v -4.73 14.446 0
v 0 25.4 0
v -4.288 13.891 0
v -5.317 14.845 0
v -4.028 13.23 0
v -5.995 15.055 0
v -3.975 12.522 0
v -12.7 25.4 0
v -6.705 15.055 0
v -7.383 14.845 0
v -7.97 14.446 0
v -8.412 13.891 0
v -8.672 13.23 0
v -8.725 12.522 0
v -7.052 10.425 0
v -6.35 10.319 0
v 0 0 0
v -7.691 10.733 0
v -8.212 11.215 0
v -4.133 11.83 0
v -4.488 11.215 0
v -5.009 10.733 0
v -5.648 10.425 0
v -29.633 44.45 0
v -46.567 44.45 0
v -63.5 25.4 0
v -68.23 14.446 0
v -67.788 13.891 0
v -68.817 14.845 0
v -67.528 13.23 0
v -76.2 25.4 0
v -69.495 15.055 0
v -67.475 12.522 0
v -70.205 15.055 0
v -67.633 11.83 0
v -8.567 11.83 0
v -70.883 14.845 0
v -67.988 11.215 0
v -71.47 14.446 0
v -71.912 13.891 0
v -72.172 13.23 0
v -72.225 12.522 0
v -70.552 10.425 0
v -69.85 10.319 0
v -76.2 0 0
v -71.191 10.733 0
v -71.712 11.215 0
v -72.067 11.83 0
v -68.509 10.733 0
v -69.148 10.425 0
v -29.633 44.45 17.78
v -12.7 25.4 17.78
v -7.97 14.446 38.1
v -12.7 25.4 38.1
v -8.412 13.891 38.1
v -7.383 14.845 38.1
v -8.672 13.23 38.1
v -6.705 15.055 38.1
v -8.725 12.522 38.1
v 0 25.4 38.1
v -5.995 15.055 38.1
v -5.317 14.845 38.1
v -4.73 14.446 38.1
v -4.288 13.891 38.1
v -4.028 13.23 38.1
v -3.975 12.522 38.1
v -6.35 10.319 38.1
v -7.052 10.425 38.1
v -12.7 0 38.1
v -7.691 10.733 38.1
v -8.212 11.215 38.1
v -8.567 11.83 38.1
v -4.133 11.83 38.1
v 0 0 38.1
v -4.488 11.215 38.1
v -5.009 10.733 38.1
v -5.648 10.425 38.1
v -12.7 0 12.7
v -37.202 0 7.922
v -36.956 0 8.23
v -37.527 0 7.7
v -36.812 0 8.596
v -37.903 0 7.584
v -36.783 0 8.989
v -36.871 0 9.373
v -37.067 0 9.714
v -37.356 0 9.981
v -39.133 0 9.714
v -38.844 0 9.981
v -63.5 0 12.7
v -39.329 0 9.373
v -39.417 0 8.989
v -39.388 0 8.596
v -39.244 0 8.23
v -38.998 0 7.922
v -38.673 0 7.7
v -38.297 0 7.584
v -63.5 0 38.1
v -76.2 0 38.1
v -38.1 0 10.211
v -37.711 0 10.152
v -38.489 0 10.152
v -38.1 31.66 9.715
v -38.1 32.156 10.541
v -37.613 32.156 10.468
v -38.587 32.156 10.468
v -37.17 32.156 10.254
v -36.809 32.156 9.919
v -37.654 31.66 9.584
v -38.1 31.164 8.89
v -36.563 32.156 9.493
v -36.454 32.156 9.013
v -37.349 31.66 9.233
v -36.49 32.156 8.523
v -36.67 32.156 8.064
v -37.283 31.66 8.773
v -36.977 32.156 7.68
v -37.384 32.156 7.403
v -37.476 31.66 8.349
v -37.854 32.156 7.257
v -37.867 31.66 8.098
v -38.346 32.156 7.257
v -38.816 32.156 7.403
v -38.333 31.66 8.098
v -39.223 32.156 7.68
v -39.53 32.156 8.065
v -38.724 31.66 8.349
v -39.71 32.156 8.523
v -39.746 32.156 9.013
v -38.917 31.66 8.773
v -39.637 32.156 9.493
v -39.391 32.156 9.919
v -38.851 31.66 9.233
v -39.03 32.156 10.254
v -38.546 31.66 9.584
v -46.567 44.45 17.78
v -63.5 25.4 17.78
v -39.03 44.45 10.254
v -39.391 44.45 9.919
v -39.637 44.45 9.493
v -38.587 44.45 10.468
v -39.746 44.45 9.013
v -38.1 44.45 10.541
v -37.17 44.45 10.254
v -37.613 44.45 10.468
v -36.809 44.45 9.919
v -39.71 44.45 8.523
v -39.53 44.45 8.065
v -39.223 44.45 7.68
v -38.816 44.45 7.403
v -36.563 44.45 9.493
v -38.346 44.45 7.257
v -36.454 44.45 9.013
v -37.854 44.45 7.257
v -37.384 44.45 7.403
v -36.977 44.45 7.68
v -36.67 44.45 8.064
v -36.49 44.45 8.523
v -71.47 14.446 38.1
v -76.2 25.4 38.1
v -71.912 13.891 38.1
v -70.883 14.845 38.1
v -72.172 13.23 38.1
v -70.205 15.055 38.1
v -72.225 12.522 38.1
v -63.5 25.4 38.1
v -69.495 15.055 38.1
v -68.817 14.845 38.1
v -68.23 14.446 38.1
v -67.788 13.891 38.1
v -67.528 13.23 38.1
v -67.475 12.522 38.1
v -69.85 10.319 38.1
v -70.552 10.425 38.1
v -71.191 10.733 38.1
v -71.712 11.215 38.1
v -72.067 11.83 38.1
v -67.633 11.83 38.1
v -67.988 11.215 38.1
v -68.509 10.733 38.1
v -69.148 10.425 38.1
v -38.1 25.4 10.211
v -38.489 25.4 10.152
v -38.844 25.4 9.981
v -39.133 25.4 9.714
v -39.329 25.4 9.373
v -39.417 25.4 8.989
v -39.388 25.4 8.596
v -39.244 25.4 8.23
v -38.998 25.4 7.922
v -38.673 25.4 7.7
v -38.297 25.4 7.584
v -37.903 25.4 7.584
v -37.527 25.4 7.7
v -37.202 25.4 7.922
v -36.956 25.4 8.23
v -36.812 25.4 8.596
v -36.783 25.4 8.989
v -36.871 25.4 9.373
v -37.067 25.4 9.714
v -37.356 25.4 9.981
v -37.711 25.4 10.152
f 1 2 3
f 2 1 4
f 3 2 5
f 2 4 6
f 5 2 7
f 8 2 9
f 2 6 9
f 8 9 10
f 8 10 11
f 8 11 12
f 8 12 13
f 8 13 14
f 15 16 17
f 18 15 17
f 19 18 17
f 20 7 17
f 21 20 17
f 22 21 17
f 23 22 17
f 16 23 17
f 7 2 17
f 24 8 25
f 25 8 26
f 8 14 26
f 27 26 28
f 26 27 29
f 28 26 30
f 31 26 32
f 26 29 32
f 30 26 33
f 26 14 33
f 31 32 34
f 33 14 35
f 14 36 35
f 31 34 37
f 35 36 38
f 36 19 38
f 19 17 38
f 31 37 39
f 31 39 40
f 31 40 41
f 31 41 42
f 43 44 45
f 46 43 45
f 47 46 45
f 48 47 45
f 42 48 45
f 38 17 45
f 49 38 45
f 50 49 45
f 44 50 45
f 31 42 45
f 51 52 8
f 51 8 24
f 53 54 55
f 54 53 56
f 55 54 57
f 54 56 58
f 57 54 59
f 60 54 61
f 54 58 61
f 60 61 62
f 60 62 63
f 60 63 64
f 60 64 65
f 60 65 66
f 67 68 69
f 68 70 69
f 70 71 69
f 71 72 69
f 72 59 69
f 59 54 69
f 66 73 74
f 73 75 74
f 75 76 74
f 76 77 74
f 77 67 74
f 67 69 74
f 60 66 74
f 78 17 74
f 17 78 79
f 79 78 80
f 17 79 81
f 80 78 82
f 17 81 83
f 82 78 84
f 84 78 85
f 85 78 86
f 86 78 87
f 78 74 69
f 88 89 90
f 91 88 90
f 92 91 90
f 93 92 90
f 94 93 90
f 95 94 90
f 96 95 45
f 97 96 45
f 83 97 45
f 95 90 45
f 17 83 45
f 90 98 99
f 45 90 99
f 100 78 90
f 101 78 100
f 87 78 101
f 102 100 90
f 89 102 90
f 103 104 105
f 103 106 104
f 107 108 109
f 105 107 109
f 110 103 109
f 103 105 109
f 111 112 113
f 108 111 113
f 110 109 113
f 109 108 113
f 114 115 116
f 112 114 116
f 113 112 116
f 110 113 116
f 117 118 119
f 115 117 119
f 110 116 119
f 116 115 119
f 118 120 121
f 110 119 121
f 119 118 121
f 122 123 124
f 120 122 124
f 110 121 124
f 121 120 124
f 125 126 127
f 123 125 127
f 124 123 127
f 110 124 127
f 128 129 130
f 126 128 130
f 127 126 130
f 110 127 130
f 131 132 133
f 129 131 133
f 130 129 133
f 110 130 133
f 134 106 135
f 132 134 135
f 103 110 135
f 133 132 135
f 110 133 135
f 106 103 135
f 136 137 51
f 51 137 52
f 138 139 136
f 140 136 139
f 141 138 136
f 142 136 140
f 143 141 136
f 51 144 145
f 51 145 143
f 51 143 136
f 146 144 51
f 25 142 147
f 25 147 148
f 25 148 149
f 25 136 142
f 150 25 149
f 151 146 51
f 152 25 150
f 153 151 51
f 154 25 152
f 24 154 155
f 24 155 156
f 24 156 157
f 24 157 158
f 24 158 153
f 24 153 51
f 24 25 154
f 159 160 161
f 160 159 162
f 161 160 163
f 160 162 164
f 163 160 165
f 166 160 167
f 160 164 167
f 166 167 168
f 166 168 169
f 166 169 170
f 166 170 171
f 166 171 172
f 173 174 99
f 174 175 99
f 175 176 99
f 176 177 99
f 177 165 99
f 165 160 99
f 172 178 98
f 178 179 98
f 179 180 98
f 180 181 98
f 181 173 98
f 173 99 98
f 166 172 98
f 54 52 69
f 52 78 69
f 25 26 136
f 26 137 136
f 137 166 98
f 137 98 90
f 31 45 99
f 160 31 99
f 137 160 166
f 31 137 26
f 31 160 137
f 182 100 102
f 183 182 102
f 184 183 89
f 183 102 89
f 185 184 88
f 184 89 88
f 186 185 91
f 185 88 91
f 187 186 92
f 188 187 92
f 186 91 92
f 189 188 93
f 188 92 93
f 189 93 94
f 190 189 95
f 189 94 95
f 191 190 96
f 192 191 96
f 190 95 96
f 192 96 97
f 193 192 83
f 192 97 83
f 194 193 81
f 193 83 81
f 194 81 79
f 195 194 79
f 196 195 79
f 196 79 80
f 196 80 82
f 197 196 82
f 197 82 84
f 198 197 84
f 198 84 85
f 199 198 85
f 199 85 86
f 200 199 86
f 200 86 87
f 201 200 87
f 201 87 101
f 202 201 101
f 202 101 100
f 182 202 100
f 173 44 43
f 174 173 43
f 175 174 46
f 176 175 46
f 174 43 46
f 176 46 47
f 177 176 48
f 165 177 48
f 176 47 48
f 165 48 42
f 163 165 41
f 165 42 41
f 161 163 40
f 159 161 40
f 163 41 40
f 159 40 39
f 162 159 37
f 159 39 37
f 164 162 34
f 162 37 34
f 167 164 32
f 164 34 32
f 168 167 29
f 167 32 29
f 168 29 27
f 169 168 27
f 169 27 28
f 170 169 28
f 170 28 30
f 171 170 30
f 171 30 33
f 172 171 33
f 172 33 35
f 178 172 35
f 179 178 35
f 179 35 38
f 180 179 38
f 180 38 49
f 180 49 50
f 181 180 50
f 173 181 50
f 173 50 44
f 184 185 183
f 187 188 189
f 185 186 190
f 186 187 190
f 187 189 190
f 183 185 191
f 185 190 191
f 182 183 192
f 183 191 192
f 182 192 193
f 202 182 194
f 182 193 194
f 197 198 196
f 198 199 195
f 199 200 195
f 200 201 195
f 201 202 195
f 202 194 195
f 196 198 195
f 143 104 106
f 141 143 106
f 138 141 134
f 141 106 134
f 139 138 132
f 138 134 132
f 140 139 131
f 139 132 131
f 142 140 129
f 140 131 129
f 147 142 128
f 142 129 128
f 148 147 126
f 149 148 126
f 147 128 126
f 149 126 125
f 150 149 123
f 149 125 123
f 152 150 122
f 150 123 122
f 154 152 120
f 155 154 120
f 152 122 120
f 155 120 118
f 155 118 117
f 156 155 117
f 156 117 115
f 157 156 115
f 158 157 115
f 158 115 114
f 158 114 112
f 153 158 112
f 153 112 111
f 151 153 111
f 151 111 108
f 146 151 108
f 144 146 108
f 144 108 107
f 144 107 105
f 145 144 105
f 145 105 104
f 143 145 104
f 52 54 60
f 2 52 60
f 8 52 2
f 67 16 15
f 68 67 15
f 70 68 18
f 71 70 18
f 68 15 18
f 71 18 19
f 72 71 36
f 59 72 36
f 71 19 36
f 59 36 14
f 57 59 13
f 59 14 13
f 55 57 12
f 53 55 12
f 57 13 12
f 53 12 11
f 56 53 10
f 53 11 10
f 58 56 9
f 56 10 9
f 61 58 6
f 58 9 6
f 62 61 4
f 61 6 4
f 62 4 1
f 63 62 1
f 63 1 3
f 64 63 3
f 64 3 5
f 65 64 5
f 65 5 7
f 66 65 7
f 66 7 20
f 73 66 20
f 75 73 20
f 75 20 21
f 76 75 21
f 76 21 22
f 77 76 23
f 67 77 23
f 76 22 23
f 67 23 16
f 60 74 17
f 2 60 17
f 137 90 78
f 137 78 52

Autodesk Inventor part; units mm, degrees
ref_plane "YZ Plane" through (0, 0, 0) normal (1, 0, 0) x (0, 1, 0)
ref_plane "XZ Plane" through (0, 0, 0) normal (0, 1, 0) x (-1, 0, 0)
ref_plane "XY Plane" through (0, 0, 0) normal (0, 0, 1) x (1, 0, 0)
sketch "Sketch1" plane through (0, 0, 0) normal (0, 1, 0) x (-1, 0, 0)
  line L0 (0, 0) -> (12.7, 0)
  line L1 (12.7, 0) -> (12.7, 38.1)
  line L2 (12.7, 38.1) -> (0, 38.1)
  line L3 (0, 38.1) -> (0, 0)
  line L4 (12.7, 0) -> (63.5, 0)
  line L5 (63.5, 0) -> (63.5, 12.7)
  line L6 (63.5, 12.7) -> (12.7, 12.7)
  line L7 (12.7, 12.7) -> (12.7, 0)
  line L8 (63.5, 0) -> (76.2, 0)
  line L9 (76.2, 0) -> (76.2, 38.1)
  line L10 (76.2, 38.1) -> (63.5, 38.1)
  line L11 (63.5, 38.1) -> (63.5, 0)
  dimension "d0" = 38.1
  dimension "d1" = 38.1
  dimension "d2" = 12.7
  dimension "d3" = 12.7
  dimension "d5" = 50.8
  dimension "d6" = 12.7
extrude "Extrusion1" add sketch "Sketch1" along normal blind 25.4
sketch "Sketch2" plane through (-63.5, 0, 38.1) normal (1, 0, 0) x (0, 0, -1)
  line L0 (25.4, 0) -> (25.4, 25.4) projected
  line L1 (25.4, 0) -> (20.32, 25.4)
  line L2 (0, 25.4) -> (25.4, 25.4) projected
  point P0 (38.1, 0)
  dimension "d9" = 5.08
extrude "Extrusion2" add sketch "Sketch2" along normal blind 50.8
sketch "Sketch3" plane through (-76.2, 0, 38.1) normal (0, 0, 1) x (1, 0, 0)
  line L0 (0, 25.4) -> (12.7, 25.4) projected
  line L1 (0, 0) -> (0, 25.4) projected
  line L2 (63.5, 25.4) -> (76.2, 25.4) projected
  line L3 (76.2, 0) -> (76.2, 25.4) projected
  point P0 (6.35, 12.7)
  point P1 (69.85, 12.7)
  dimension "d12" = 12.7
  dimension "d13" = 25.4
  dimension "d14" = 6.35
  dimension "d15" = 12.7
  dimension "d16" = 12.7
  dimension "d17" = 25.4
  dimension "d18" = 12.7
  dimension "d19" = 6.35
hole "Hole1" at (-69.85, 12.7, 38.1) at (-6.35, 12.7, 38.1) direction (0, 0, -1) diameter 4.7625 end through all
sketch "Sketch4" plane through (0, 25.4, 0) normal (0, 1, 0) x (1, 0, 0)
  line L0 (0, 0) -> (-76.2, 0) projected
  line L1 (0, -38.1) -> (0, 0) projected
  line L2 (-12.7, -17.78) -> (-12.7, -38.1) projected
  point P0 (-38.1, -8.89)
  dimension "d27" = 38.1
  dimension "d28" = 20.32
  dimension "d29" = 76.2
  dimension "d30" = 38.1
  dimension "d31" = 8.89
hole "Hole2" at (-38.1, 25.4, 8.89) direction (0, -1, 0) diameter 2.6416 end through all thread size "6-32 UNC" class "2B" standard "ANSI Unified Screw Threads"
sketch "Sketch5" plane through (0, 25.4, 0) normal (0, 1, 0) x (1, 0, 0)
  line L0 (-63.5, -17.78) -> (-12.7, -17.78) projected
  line L1 (0, 0) -> (-76.2, 0) projected
  line L2 (-63.5, -17.78) -> (-12.7, -17.78)
  line L3 (-12.7, -17.78) -> (-12.7, 0)
  line L4 (-12.7, 0) -> (-63.5, 0)
  line L5 (-63.5, 0) -> (-63.5, -17.78)
  line L6 (-12.7, -38.1) -> (0, -38.1) projected
  line L7 (0, -38.1) -> (0, 0) projected
  dimension "d39" = 12.7
  dimension "d40" = 12.7
extrude "Extrusion3" add sketch "Sketch5" along normal blind 19.05
sketch "Sketch6" plane through (-63.5, 25.4, 17.78) normal (0, 0, 1) x (1, 0, 0)
  line L0 (0, 0) -> (50.8, 0) projected
  line L1 (0, 0) -> (16.9333, 19.05)
  line L2 (50.8, 19.05) -> (0, 19.05) projected
  line L3 (63.5, 0) -> (50.8, 0) projected
  line L4 (50.8, 0) -> (33.8667, 19.05)
  line L5 (0, 0) -> (0, 19.05) projected
  line L6 (0, 0) -> (50.8, 0) projected
  line L7 (50.8, 0) -> (50.8, 19.05) projected
  line L8 (0, 19.05) -> (50.8, 19.05) projected
  line L9 (0, 0) -> (0, 19.05) projected
  point P0 (63.5, -25.4)
  dimension "d43" = 50.8
  dimension "d44" = 16.9333
  dimension "d45" = 16.9333
extrude "Extrusion4" cut sketch "Sketch6" against normal blind 19.05 contours L5 L2 L1 | L4 L2 L7
sketch "Sketch7" plane through (0, 44.45, 0) normal (0, 1, 0) x (1, 0, 0)
  circle A0 centre (-38.1, -8.89) radius 1.3208 projected
  point P0 (0, 0)
hole "Hole3" at (-38.1, 44.45, 8.89) direction (0, -1, 0) diameter 3.302 depth 12.2936 tip angle 118 thread size "8-32 UNC" class "2B" standard "ANSI Unified Screw Threads"
equation "\"d1\" = d0"
equation "\"d3\" = d2"
equation "\"d14\" = 0.5 * d12"
equation "\"d15\" = 0.5 * d13"
equation "\"d18\" = 0.5 * d17"
equation "\"d19\" = 0.5 * d16"
equation "\"d30\" = 0.5 * d29"
equation "\"d31\" = -0.5 * d28 + 0.5 * d27"
equation "\"d40\" = d39"
equation "\"d44\" = 0.333333 * d43"
equation "\"d45\" = 0.333333 * d43"
properties part number "sliding piece for grabber"
